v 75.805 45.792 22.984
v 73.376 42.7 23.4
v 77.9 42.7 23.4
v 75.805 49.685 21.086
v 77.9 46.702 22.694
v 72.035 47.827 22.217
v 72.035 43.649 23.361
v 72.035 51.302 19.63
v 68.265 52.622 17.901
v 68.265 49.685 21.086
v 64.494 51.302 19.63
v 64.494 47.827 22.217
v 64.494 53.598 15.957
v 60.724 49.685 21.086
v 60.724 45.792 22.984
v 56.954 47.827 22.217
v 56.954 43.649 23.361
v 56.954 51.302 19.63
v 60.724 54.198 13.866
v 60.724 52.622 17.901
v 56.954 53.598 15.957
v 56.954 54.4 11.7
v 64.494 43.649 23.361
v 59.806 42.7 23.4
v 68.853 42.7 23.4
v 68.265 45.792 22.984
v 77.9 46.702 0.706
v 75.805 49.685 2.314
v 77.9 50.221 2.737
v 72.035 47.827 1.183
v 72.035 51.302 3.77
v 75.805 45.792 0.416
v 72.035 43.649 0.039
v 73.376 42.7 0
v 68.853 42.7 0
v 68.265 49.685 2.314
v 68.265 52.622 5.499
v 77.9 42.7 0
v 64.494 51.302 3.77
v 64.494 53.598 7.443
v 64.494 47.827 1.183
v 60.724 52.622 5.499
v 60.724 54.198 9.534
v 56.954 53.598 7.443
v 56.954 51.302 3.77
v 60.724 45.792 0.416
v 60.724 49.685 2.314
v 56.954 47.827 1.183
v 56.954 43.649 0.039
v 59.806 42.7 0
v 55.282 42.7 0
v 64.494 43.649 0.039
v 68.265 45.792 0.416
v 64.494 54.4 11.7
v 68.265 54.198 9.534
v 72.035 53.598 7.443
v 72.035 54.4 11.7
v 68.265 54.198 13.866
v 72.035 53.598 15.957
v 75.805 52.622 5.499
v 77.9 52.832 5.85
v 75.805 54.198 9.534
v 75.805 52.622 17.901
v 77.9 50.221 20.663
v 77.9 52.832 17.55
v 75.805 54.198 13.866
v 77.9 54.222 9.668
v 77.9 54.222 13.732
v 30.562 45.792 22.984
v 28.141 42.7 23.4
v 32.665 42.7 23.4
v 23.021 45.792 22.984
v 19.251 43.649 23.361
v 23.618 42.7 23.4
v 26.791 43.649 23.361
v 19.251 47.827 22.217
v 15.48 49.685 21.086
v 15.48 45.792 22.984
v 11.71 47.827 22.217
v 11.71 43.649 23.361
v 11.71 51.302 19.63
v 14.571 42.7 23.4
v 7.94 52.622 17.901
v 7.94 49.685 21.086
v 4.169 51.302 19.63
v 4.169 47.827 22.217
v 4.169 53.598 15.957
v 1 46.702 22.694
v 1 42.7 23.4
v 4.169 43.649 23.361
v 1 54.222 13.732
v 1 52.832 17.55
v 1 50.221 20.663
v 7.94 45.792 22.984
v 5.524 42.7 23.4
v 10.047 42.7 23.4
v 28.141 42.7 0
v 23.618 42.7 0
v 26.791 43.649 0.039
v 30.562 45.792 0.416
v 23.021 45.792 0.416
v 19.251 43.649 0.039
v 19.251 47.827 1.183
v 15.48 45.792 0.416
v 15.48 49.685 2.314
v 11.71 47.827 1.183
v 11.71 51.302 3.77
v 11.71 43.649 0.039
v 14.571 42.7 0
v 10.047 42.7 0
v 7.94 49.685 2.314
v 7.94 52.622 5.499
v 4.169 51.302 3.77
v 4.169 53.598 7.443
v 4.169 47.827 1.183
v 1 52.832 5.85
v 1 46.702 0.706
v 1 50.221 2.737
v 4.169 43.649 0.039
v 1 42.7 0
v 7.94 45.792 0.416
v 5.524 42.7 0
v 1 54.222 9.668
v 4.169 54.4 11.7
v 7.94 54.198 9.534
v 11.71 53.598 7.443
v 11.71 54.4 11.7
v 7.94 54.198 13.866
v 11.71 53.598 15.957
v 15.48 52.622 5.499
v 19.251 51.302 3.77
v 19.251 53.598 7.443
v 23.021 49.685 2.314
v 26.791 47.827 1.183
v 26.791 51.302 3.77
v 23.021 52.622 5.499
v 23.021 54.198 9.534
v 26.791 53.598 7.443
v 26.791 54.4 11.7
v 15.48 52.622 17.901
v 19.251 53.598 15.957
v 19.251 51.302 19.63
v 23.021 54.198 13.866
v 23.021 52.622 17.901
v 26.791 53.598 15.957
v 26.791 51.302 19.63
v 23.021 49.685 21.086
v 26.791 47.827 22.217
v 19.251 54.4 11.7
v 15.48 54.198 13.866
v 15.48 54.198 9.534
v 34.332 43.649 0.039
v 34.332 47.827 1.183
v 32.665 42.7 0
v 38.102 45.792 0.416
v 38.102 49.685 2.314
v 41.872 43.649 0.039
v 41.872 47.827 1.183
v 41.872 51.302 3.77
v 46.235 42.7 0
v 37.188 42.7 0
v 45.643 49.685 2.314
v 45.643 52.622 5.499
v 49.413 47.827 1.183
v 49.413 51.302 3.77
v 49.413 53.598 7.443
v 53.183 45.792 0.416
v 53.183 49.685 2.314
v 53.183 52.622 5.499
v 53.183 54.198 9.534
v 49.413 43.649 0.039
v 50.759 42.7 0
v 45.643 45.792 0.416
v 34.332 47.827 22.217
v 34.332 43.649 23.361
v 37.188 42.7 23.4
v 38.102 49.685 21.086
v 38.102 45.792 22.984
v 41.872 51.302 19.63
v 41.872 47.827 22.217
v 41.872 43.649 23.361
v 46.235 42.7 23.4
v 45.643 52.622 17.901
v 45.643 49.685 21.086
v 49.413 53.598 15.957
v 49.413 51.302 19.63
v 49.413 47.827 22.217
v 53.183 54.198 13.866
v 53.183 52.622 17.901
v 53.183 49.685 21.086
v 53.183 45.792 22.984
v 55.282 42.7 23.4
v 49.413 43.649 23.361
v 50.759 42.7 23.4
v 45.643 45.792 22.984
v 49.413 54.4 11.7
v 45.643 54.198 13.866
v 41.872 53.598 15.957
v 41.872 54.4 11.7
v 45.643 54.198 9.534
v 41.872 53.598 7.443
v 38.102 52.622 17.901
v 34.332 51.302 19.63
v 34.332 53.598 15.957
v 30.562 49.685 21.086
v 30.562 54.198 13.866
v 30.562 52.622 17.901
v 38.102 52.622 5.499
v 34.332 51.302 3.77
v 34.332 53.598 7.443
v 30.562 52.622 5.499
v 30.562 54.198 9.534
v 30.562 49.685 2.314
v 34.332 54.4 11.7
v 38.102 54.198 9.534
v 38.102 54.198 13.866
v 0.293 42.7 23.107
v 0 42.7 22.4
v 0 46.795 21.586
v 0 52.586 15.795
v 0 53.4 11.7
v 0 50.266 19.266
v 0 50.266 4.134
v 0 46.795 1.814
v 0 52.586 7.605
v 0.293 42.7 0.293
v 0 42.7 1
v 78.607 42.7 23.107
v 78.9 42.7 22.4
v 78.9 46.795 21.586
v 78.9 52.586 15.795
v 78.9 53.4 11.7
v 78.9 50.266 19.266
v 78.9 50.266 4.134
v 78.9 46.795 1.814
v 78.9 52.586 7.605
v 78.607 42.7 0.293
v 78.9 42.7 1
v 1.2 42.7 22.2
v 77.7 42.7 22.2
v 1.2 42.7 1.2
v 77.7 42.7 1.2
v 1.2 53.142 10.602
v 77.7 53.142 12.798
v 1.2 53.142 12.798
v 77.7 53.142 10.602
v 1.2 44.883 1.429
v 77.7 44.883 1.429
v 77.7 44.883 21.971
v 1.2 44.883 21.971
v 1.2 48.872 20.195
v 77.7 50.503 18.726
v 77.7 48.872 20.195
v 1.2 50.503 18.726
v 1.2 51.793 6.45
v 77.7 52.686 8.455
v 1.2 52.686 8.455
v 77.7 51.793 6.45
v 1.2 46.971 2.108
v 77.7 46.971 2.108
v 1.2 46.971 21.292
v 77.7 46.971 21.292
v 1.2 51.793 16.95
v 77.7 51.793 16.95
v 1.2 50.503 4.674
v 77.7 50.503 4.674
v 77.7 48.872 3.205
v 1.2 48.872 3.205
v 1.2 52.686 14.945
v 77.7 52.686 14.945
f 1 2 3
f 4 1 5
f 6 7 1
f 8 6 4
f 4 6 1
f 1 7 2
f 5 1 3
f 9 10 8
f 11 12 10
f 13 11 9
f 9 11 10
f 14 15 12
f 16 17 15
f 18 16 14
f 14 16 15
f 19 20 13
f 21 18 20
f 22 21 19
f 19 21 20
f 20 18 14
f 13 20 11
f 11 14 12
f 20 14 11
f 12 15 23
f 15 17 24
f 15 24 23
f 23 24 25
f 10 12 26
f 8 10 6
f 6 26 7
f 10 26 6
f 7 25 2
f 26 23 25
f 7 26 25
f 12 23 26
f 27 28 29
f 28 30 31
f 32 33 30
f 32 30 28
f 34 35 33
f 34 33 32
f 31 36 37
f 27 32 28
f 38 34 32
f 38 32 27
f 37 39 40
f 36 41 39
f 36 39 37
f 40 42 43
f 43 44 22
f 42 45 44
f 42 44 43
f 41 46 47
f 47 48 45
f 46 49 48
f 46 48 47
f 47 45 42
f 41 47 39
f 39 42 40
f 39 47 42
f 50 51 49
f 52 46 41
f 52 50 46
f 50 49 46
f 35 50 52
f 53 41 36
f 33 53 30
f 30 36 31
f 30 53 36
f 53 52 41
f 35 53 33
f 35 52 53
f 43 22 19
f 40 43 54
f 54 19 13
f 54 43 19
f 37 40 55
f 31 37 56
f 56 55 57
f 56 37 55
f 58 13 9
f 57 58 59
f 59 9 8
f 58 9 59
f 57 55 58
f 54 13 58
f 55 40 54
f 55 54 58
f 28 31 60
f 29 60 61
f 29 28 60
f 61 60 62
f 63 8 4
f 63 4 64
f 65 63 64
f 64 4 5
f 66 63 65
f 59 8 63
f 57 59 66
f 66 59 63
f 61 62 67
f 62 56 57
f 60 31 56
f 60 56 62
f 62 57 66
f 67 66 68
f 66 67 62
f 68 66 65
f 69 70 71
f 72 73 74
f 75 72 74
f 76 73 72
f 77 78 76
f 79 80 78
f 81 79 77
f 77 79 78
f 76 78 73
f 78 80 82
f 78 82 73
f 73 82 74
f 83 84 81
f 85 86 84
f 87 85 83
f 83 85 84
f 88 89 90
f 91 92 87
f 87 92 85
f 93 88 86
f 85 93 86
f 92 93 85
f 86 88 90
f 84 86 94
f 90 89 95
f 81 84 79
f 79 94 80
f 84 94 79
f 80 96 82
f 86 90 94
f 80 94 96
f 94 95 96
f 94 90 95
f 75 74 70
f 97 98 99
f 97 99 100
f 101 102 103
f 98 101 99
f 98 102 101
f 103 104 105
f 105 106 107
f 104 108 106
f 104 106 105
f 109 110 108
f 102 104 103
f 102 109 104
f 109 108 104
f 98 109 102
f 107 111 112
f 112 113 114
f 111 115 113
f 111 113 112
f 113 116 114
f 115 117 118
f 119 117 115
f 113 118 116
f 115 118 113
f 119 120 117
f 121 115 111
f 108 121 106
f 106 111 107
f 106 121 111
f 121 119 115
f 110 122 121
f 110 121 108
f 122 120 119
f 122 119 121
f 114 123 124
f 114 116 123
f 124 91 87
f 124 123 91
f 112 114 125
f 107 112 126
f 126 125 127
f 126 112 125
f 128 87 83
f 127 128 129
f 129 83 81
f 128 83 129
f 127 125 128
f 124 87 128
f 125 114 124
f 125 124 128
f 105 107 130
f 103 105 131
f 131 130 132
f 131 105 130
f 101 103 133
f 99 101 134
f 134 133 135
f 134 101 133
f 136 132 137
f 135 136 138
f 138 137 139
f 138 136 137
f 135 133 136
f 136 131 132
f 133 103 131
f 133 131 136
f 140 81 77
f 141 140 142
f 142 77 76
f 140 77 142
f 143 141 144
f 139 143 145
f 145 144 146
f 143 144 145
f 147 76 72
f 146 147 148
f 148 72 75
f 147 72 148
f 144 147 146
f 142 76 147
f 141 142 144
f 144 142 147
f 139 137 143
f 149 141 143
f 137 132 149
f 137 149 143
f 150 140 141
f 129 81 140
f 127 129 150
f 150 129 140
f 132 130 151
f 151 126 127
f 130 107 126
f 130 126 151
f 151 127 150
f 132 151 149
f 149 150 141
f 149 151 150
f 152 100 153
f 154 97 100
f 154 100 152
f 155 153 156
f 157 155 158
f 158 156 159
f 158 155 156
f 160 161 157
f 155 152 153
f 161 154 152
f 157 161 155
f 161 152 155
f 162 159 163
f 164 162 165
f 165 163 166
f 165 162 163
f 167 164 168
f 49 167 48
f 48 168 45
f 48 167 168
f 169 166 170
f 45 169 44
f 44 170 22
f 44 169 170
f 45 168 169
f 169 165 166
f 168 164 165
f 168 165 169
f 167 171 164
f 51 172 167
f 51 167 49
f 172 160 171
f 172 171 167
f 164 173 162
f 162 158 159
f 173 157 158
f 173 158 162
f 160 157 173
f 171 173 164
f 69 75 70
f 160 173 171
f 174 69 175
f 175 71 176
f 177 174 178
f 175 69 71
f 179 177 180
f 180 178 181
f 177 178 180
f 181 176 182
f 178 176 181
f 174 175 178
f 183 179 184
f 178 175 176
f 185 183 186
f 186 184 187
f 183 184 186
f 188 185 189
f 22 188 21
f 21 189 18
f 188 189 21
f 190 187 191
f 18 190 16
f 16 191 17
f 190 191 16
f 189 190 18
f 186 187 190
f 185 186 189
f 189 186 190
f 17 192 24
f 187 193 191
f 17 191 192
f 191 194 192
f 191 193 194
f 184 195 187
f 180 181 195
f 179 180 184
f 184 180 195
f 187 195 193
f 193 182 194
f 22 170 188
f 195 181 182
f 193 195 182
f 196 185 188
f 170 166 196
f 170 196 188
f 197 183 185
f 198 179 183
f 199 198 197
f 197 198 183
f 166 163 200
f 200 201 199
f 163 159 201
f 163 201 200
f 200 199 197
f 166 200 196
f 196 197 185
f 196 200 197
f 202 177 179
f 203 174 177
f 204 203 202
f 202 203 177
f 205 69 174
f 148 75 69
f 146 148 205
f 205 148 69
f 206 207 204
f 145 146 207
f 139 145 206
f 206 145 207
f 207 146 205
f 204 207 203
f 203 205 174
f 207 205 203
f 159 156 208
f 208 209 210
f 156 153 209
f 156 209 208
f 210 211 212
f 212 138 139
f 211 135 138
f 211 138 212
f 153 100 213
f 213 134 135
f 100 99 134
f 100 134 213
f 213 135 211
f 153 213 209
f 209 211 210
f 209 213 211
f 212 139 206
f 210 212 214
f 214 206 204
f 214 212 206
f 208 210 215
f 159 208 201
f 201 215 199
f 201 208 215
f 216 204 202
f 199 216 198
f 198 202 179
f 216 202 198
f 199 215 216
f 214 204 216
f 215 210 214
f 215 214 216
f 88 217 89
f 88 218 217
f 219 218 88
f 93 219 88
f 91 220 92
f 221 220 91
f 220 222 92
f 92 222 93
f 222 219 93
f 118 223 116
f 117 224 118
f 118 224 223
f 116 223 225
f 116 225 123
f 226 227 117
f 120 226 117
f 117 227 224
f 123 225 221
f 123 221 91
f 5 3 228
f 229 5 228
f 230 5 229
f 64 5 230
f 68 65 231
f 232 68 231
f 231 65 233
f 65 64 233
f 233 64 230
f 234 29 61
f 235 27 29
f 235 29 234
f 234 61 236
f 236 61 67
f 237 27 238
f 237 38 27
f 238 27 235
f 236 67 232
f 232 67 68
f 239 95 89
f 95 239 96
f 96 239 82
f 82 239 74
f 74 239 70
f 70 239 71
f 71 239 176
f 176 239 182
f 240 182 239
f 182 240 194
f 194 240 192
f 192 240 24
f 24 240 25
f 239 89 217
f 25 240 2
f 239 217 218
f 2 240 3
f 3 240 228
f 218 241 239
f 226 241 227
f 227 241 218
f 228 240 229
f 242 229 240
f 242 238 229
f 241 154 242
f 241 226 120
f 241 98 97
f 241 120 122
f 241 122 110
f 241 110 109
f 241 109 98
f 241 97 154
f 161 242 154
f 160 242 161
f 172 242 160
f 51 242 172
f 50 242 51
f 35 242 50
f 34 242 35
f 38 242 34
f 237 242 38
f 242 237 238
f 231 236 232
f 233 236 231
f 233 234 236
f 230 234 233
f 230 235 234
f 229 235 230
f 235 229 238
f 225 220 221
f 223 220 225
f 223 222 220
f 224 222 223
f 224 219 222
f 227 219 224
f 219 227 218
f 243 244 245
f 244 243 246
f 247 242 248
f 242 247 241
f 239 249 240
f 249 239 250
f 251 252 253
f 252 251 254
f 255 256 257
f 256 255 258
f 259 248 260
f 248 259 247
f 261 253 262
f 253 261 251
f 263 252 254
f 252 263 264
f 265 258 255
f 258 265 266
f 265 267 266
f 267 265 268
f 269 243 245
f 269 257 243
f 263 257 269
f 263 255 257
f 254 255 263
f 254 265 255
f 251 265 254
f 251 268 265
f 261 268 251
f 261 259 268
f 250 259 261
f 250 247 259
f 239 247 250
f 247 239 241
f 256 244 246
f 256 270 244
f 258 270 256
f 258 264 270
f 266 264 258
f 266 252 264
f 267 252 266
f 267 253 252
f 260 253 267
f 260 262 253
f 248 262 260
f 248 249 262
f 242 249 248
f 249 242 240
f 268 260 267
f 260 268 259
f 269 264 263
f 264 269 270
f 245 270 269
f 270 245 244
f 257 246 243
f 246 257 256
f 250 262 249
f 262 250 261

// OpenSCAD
// CSG file generated from FreeCAD 0.18.Unknown
group() {
 group(){
difference() {
polyhedron ( points = [[1.000000,42.700001,23.400000],[77.900002,42.700001,23.400000],[1.000000,42.700001,0.000000],[77.900002,42.700001,0.000000],[78.900002,42.700001,22.400000],[78.900002,42.700001,11.700000],[0.000000,42.700001,11.700000],[-0.000000,42.700001,22.400000],[0.000000,42.700001,1.000000],[78.900002,42.700001,1.000000],[5.523530,42.700001,23.400000],[10.047059,42.700001,23.400000],[14.570588,42.700001,23.400000],[19.094118,42.700001,23.400000],[23.617647,42.700001,23.400000],[28.141176,42.700001,23.400000],[32.664707,42.700001,23.400000],[37.188236,42.700001,23.400000],[41.711765,42.700001,23.400000],[46.235294,42.700001,23.400000],[50.758823,42.700001,23.400000],[55.282352,42.700001,23.400000],[59.805882,42.700001,23.400000],[64.329414,42.700001,23.400000],[68.852943,42.700001,23.400000],[73.376472,42.700001,23.400000],[1.000000,46.701637,0.705596],[1.000000,50.220615,2.737280],[1.000000,52.832497,5.850000],[1.000000,54.222252,9.668316],[1.000000,54.222252,13.731684],[1.000000,52.832497,17.549999],[1.000000,50.220615,20.662720],[1.000000,46.701637,22.694405],[77.900002,46.701637,0.705596],[77.900002,50.220615,2.737280],[77.900002,52.832497,5.850000],[77.900002,54.222252,9.668316],[77.900002,54.222252,13.731684],[77.900002,52.832497,17.549999],[77.900002,50.220615,20.662720],[77.900002,46.701637,22.694405],[5.523530,42.700001,0.000000],[10.047059,42.700001,0.000000],[14.570588,42.700001,0.000000],[19.094118,42.700001,0.000000],[23.617647,42.700001,0.000000],[28.141176,42.700001,0.000000],[32.664707,42.700001,0.000000],[37.188236,42.700001,0.000000],[41.711765,42.700001,0.000000],[46.235294,42.700001,0.000000],[50.758823,42.700001,0.000000],[55.282352,42.700001,0.000000],[59.805882,42.700001,0.000000],[64.329414,42.700001,0.000000],[68.852943,42.700001,0.000000],[73.376472,42.700001,0.000000],[78.900002,42.700001,14.375000],[78.900002,42.700001,17.049999],[78.900002,42.700001,19.725000],[78.607109,42.700001,23.107107],[4.641177,42.700001,11.700000],[9.282353,42.700001,11.700000],[13.923530,42.700001,11.700000],[18.564707,42.700001,11.700000],[23.205883,42.700001,11.700000],[27.847059,42.700001,11.700000],[32.488235,42.700001,11.700000],[37.129414,42.700001,11.700000],[41.770588,42.700001,11.700000],[46.411766,42.700001,11.700000],[51.052940,42.700001,11.700000],[55.694118,42.700001,11.700000],[60.335293,42.700001,11.700000],[64.976471,42.700001,11.700000],[69.617645,42.700001,11.700000],[74.258827,42.700001,11.700000],[0.000000,42.700001,14.375000],[0.000000,42.700001,17.049999],[0.000000,42.700001,19.725000],[0.292893,42.700001,23.107107],[0.292893,42.700001,0.292893],[0.000000,46.794712,1.814489],[0.000000,50.266041,4.133957],[0.000000,52.585510,7.605287],[0.000000,53.400002,11.700000],[-0.000000,52.585510,15.794713],[-0.000000,50.266041,19.266043],[-0.000000,46.794712,21.585510],[78.607109,42.700001,0.292893],[78.900002,46.794712,1.814489],[78.900002,50.266041,4.133957],[78.900002,52.585510,7.605287],[78.900002,53.400002,11.700000],[78.900002,52.585510,15.794713],[78.900002,50.266041,19.266043],[78.900002,46.794712,21.585510],[0.000000,42.700001,9.025000],[0.000000,42.700001,6.350000],[0.000000,42.700001,3.675000],[78.900002,42.700001,9.025000],[78.900002,42.700001,6.350000],[78.900002,42.700001,3.675000],[26.791178,43.649349,23.361422],[11.709884,51.302250,19.630404],[26.791178,43.649349,0.038579],[56.953762,54.400002,11.700000],[41.872471,51.302250,19.630404],[56.953762,43.649349,23.361422],[72.035057,51.302250,19.630404],[72.035057,51.302250,3.769596],[56.953762,43.649349,0.038579],[41.872471,51.302250,3.769596],[11.709884,51.302250,3.769596],[26.791178,54.400002,11.700000],[72.035057,43.649349,23.361422],[64.494408,47.827221,22.216730],[64.494408,53.598080,15.956975],[56.953762,51.302250,19.630404],[72.035057,43.649349,0.038579],[64.494408,53.598080,7.443025],[64.494408,47.827221,1.183270],[56.953762,51.302250,3.769596],[72.035057,54.400002,11.700000],[19.250530,47.827221,22.216730],[11.709884,43.649349,23.361422],[4.169238,47.827221,22.216730],[4.169238,53.598080,15.956975],[19.250530,47.827221,1.183270],[11.709884,43.649349,0.038579],[4.169238,53.598080,7.443025],[4.169238,47.827221,1.183270],[11.709884,54.400002,11.700000],[19.250530,53.598080,7.443025],[26.791178,51.302250,3.769596],[19.250530,53.598080,15.956975],[26.791178,51.302250,19.630404],[34.331825,47.827221,1.183270],[41.872471,43.649349,0.038579],[49.413116,47.827221,1.183270],[49.413116,53.598080,7.443025],[34.331825,47.827221,22.216730],[41.872471,43.649349,23.361422],[49.413116,53.598080,15.956975],[49.413116,47.827221,22.216730],[41.872471,54.400002,11.700000],[34.331825,53.598080,15.956975],[34.331825,53.598080,7.443025],[75.805382,45.791725,22.984116],[75.805382,49.685474,21.085794],[72.035057,47.827221,22.216730],[68.264732,49.685474,21.085794],[68.264732,52.621655,17.900867],[64.494408,51.302250,19.630404],[60.724087,45.791725,22.984116],[60.724087,49.685474,21.085794],[56.953762,47.827221,22.216730],[60.724087,52.621655,17.900867],[60.724087,54.197773,13.865925],[56.953762,53.598080,15.956975],[64.494408,43.649349,23.361422],[68.264732,45.791725,22.984116],[75.805382,49.685474,2.314205],[75.805382,45.791725,0.415885],[72.035057,47.827221,1.183270],[68.264732,52.621655,5.499132],[68.264732,49.685474,2.314205],[64.494408,51.302250,3.769596],[60.724087,54.197773,9.534076],[60.724087,52.621655,5.499132],[56.953762,53.598080,7.443025],[60.724087,49.685474,2.314205],[60.724087,45.791725,0.415885],[56.953762,47.827221,1.183270],[64.494408,43.649349,0.038579],[68.264732,45.791725,0.415885],[64.494408,54.400002,11.700000],[68.264732,54.197773,9.534076],[72.035057,53.598080,7.443025],[68.264732,54.197773,13.865925],[72.035057,53.598080,15.956975],[75.805382,52.621655,5.499132],[75.805382,52.621655,17.900867],[75.805382,54.197773,13.865925],[75.805382,54.197773,9.534076],[23.020853,45.791725,22.984116],[19.250530,43.649349,23.361422],[15.480207,45.791725,22.984116],[15.480207,49.685474,21.085794],[11.709884,47.827221,22.216730],[7.939561,49.685474,21.085794],[7.939561,52.621655,17.900867],[4.169238,51.302250,19.630404],[4.169238,43.649349,23.361422],[7.939561,45.791725,22.984116],[23.020853,45.791725,0.415885],[19.250530,43.649349,0.038579],[15.480207,49.685474,2.314205],[15.480207,45.791725,0.415885],[11.709884,47.827221,1.183270],[7.939561,52.621655,5.499132],[7.939561,49.685474,2.314205],[4.169238,51.302250,3.769596],[4.169238,43.649349,0.038579],[7.939561,45.791725,0.415885],[4.169238,54.400002,11.700000],[7.939561,54.197773,9.534076],[11.709884,53.598080,7.443025],[7.939561,54.197773,13.865925],[11.709884,53.598080,15.956975],[15.480207,52.621655,5.499132],[19.250530,51.302250,3.769596],[23.020853,49.685474,2.314205],[26.791178,47.827221,1.183270],[23.020853,52.621655,5.499132],[23.020853,54.197773,9.534076],[26.791178,53.598080,7.443025],[15.480207,52.621655,17.900867],[19.250530,51.302250,19.630404],[23.020853,54.197773,13.865925],[23.020853,52.621655,17.900867],[26.791178,53.598080,15.956975],[23.020853,49.685474,21.085794],[26.791178,47.827221,22.216730],[19.250530,54.400002,11.700000],[15.480207,54.197773,13.865925],[15.480207,54.197773,9.534076],[30.561501,45.791725,0.415885],[34.331825,43.649349,0.038579],[38.102146,45.791725,0.415885],[38.102146,49.685474,2.314205],[41.872471,47.827221,1.183270],[45.642792,49.685474,2.314205],[45.642792,52.621655,5.499132],[49.413116,51.302250,3.769596],[53.183441,45.791725,0.415885],[53.183441,49.685474,2.314205],[53.183441,52.621655,5.499132],[53.183441,54.197773,9.534076],[49.413116,43.649349,0.038579],[45.642792,45.791725,0.415885],[30.561501,45.791725,22.984116],[34.331825,43.649349,23.361422],[38.102146,49.685474,21.085794],[38.102146,45.791725,22.984116],[41.872471,47.827221,22.216730],[45.642792,52.621655,17.900867],[45.642792,49.685474,21.085794],[49.413116,51.302250,19.630404],[53.183441,54.197773,13.865925],[53.183441,52.621655,17.900867],[53.183441,49.685474,21.085794],[53.183441,45.791725,22.984116],[49.413116,43.649349,23.361422],[45.642792,45.791725,22.984116],[49.413116,54.400002,11.700000],[45.642792,54.197773,13.865925],[41.872471,53.598080,15.956975],[45.642792,54.197773,9.534076],[41.872471,53.598080,7.443025],[38.102146,52.621655,17.900867],[34.331825,51.302250,19.630404],[30.561501,49.685474,21.085794],[30.561501,52.621655,17.900867],[30.561501,54.197773,13.865925],[38.102146,52.621655,5.499132],[34.331825,51.302250,3.769596],[30.561501,54.197773,9.534076],[30.561501,52.621655,5.499132],[30.561501,49.685474,2.314205],[34.331825,54.400002,11.700000],[38.102146,54.197773,9.534076],[38.102146,54.197773,13.865925],[45.951241,42.700001,17.549999],[70.887100,42.700001,17.549999],[21.015387,42.700001,17.549999],[77.121063,42.700001,21.149181],[77.121063,42.700001,13.950819],[52.185204,42.700001,21.149181],[52.185204,42.700001,13.950819],[58.419170,42.700001,17.549999],[64.653130,42.700001,13.950819],[64.653130,42.700001,21.149181],[2.313494,42.700001,21.149181],[2.313494,42.700001,13.950819],[8.547459,42.700001,17.549999],[14.781422,42.700001,13.950819],[14.781422,42.700001,21.149181],[39.717278,42.700001,13.950819],[39.717278,42.700001,21.149181],[33.483315,42.700001,17.549999],[27.249350,42.700001,21.149181],[27.249350,42.700001,13.950819],[74.004082,42.700001,22.948771],[74.004082,42.700001,19.349590],[70.887100,42.700001,21.149181],[74.004082,42.700001,15.750410],[74.004082,42.700001,12.151229],[70.887100,42.700001,13.950819],[77.121063,42.700001,17.549999],[55.302189,42.700001,22.948771],[49.068222,42.700001,22.948771],[49.068222,42.700001,19.349590],[45.951241,42.700001,21.149181],[55.302189,42.700001,12.151229],[49.068222,42.700001,15.750410],[49.068222,42.700001,12.151229],[45.951241,42.700001,13.950819],[52.185204,42.700001,17.549999],[55.302189,42.700001,15.750410],[58.419170,42.700001,13.950819],[55.302189,42.700001,19.349590],[58.419170,42.700001,21.149181],[61.536152,42.700001,12.151229],[67.770111,42.700001,12.151229],[67.770111,42.700001,15.750410],[61.536152,42.700001,22.948771],[67.770111,42.700001,19.349590],[67.770111,42.700001,22.948771],[64.653130,42.700001,17.549999],[61.536152,42.700001,19.349590],[61.536152,42.700001,15.750410],[5.430476,42.700001,22.948771],[5.430476,42.700001,12.151229],[2.313494,42.700001,17.549999],[5.430476,42.700001,15.750410],[8.547459,42.700001,13.950819],[5.430476,42.700001,19.349590],[8.547459,42.700001,21.149181],[11.664440,42.700001,12.151229],[17.898403,42.700001,12.151229],[17.898403,42.700001,15.750410],[21.015387,42.700001,13.950819],[11.664440,42.700001,22.948771],[17.898403,42.700001,19.349590],[17.898403,42.700001,22.948771],[21.015387,42.700001,21.149181],[14.781422,42.700001,17.549999],[11.664440,42.700001,19.349590],[11.664440,42.700001,15.750410],[36.600296,42.700001,12.151229],[42.834259,42.700001,12.151229],[42.834259,42.700001,15.750410],[36.600296,42.700001,22.948771],[42.834259,42.700001,19.349590],[42.834259,42.700001,22.948771],[39.717278,42.700001,17.549999],[36.600296,42.700001,19.349590],[33.483315,42.700001,21.149181],[36.600296,42.700001,15.750410],[33.483315,42.700001,13.950819],[30.366331,42.700001,22.948771],[24.132368,42.700001,22.948771],[24.132368,42.700001,19.349590],[30.366331,42.700001,12.151229],[24.132368,42.700001,15.750410],[24.132368,42.700001,12.151229],[27.249350,42.700001,17.549999],[30.366331,42.700001,15.750410],[30.366331,42.700001,19.349590],[45.951241,42.700001,5.850000],[21.015387,42.700001,5.850000],[70.887100,42.700001,5.850000],[77.121063,42.700001,2.250819],[77.121063,42.700001,9.449181],[52.185204,42.700001,2.250819],[52.185204,42.700001,9.449181],[58.419170,42.700001,5.850000],[64.653130,42.700001,9.449181],[64.653130,42.700001,2.250819],[2.313494,42.700001,2.250819],[2.313494,42.700001,9.449181],[8.547459,42.700001,5.850000],[14.781422,42.700001,9.449181],[14.781422,42.700001,2.250819],[39.717278,42.700001,9.449181],[39.717278,42.700001,2.250819],[33.483315,42.700001,5.850000],[27.249350,42.700001,2.250819],[27.249350,42.700001,9.449181],[74.004082,42.700001,0.451229],[74.004082,42.700001,4.050410],[70.887100,42.700001,2.250819],[74.004082,42.700001,7.649590],[74.004082,42.700001,11.248771],[70.887100,42.700001,9.449181],[77.121063,42.700001,5.850000],[55.302189,42.700001,0.451229],[49.068222,42.700001,0.451229],[49.068222,42.700001,4.050410],[45.951241,42.700001,2.250819],[55.302189,42.700001,11.248771],[49.068222,42.700001,7.649590],[49.068222,42.700001,11.248771],[45.951241,42.700001,9.449181],[52.185204,42.700001,5.850000],[55.302189,42.700001,7.649590],[58.419170,42.700001,9.449181],[55.302189,42.700001,4.050410],[58.419170,42.700001,2.250819],[61.536152,42.700001,11.248771],[67.770111,42.700001,11.248771],[67.770111,42.700001,7.649590],[61.536152,42.700001,0.451229],[67.770111,42.700001,4.050410],[67.770111,42.700001,0.451229],[64.653130,42.700001,5.850000],[61.536152,42.700001,4.050410],[61.536152,42.700001,7.649590],[5.430476,42.700001,0.451229],[5.430476,42.700001,11.248771],[2.313494,42.700001,5.850000],[5.430476,42.700001,7.649590],[8.547459,42.700001,9.449181],[5.430476,42.700001,4.050410],[8.547459,42.700001,2.250819],[11.664440,42.700001,11.248771],[17.898403,42.700001,11.248771],[17.898403,42.700001,7.649590],[21.015387,42.700001,9.449181],[11.664440,42.700001,0.451229],[17.898403,42.700001,4.050410],[17.898403,42.700001,0.451229],[21.015387,42.700001,2.250819],[14.781422,42.700001,5.850000],[11.664440,42.700001,4.050410],[11.664440,42.700001,7.649590],[36.600296,42.700001,11.248771],[42.834259,42.700001,11.248771],[42.834259,42.700001,7.649590],[36.600296,42.700001,0.451229],[42.834259,42.700001,4.050410],[42.834259,42.700001,0.451229],[39.717278,42.700001,5.850000],[36.600296,42.700001,4.050410],[33.483315,42.700001,2.250819],[36.600296,42.700001,7.649590],[33.483315,42.700001,9.449181],[30.366331,42.700001,0.451229],[24.132368,42.700001,0.451229],[24.132368,42.700001,4.050410],[30.366331,42.700001,11.248771],[24.132368,42.700001,7.649590],[24.132368,42.700001,11.248771],[27.249350,42.700001,5.850000],[30.366331,42.700001,7.649590],[30.366331,42.700001,4.050410],[78.900002,48.918293,6.124682],[78.900002,48.918293,17.275318],[78.900002,44.089928,3.337023],[78.900002,44.089928,8.912341],[78.900002,44.089928,14.487659],[78.900002,44.089928,20.062977],[78.900002,48.918293,11.700000],[78.900002,48.918293,3.337023],[78.900002,46.504108,4.730853],[78.900002,46.504108,7.518512],[78.900002,44.089928,6.124682],[78.900002,46.504108,1.943194],[78.900002,48.918293,20.062977],[78.900002,46.504108,15.881489],[78.900002,46.504108,18.669147],[78.900002,44.089928,17.275318],[78.900002,46.504108,21.456806],[78.900002,44.089928,11.700000],[78.900002,46.504108,13.093829],[78.900002,48.918293,14.487659],[78.900002,46.504108,10.306170],[78.900002,48.918293,8.912341],[78.900002,51.332478,15.881489],[78.900002,51.332478,7.518512],[78.900002,51.332478,10.306170],[78.900002,51.332478,13.093829],[0.000000,48.918293,6.124682],[0.000000,48.918293,17.275318],[0.000000,44.089928,3.337023],[0.000000,44.089928,8.912341],[0.000000,44.089928,14.487659],[0.000000,44.089928,20.062977],[0.000000,48.918293,11.700000],[0.000000,48.918293,3.337023],[0.000000,46.504108,4.730853],[0.000000,46.504108,7.518512],[0.000000,44.089928,6.124682],[0.000000,46.504108,1.943194],[0.000000,48.918293,20.062977],[0.000000,46.504108,15.881489],[0.000000,46.504108,18.669147],[0.000000,44.089928,17.275318],[0.000000,46.504108,21.456806],[0.000000,44.089928,11.700000],[0.000000,46.504108,13.093829],[0.000000,48.918293,14.487659],[0.000000,46.504108,10.306170],[0.000000,48.918293,8.912341],[0.000000,51.332478,15.881489],[0.000000,51.332478,7.518512],[0.000000,51.332478,10.306170],[0.000000,51.332478,13.093829]], triangles = [[1,149,25],[149,41,150],[151,116,149],[110,151,150],[149,150,151],[116,25,149],[149,1,41],[153,152,110],[154,117,152],[118,154,153],[152,153,154],[156,155,117],[157,109,155],[119,157,156],[155,156,157],[159,158,118],[160,119,158],[107,160,159],[158,159,160],[156,158,119],[154,118,158],[117,154,156],[158,156,154],[161,117,155],[155,109,22],[155,22,161],[161,22,23],[162,152,117],[151,110,152],[116,151,162],[152,162,151],[25,116,24],[24,161,23],[162,161,24],[116,162,24],[117,161,162],[163,35,34],[165,111,163],[120,165,164],[163,164,165],[56,120,57],[120,164,57],[167,166,111],[164,163,34],[57,164,3],[164,34,3],[168,121,166],[122,168,167],[166,167,168],[170,169,121],[171,107,169],[123,171,170],[169,170,171],[173,172,122],[174,123,172],[112,174,173],[172,173,174],[170,172,123],[168,122,172],[121,168,170],[172,170,168],[53,112,54],[122,175,173],[173,175,54],[112,173,54],[175,55,54],[167,176,122],[165,120,176],[111,165,167],[176,167,165],[175,122,176],[55,175,56],[176,120,56],[176,56,175],[159,169,107],[177,121,169],[118,177,159],[169,159,177],[178,166,121],[179,111,166],[124,179,178],[166,178,179],[153,180,118],[181,124,180],[110,181,153],[180,153,181],[178,180,124],[177,118,180],[121,177,178],[180,178,177],[182,163,111],[182,36,35],[163,182,35],[182,185,36],[150,183,110],[150,40,183],[183,40,39],[150,41,40],[183,39,184],[181,110,183],[124,181,184],[183,184,181],[185,37,36],[179,124,185],[111,179,182],[185,182,179],[184,185,124],[37,185,38],[184,38,185],[184,39,38],[16,242,15],[14,187,13],[186,187,14],[104,186,14],[125,187,186],[189,188,125],[190,126,188],[105,190,189],[188,189,190],[187,125,188],[188,126,12],[188,12,187],[187,12,13],[192,191,105],[193,127,191],[128,193,192],[191,192,193],[0,194,33],[128,30,31],[128,31,193],[32,33,127],[127,193,32],[193,31,32],[127,33,194],[195,191,127],[10,194,0],[190,105,191],[126,190,195],[191,195,190],[12,126,11],[127,194,195],[126,195,11],[11,195,10],[194,10,195],[15,104,14],[46,106,47],[106,228,47],[197,129,196],[45,197,46],[196,106,46],[196,46,197],[199,198,129],[200,114,198],[130,200,199],[198,199,200],[43,130,44],[129,197,199],[199,197,44],[130,199,44],[197,45,44],[202,201,114],[203,131,201],[132,203,202],[201,202,203],[131,203,28],[27,132,26],[132,204,26],[203,27,28],[203,132,27],[26,204,2],[202,205,132],[200,130,205],[114,200,202],[205,202,200],[204,132,205],[42,205,43],[205,130,43],[2,204,42],[204,205,42],[206,131,29],[131,28,29],[128,206,30],[206,29,30],[207,201,131],[208,114,201],[133,208,207],[201,207,208],[192,209,128],[210,133,209],[105,210,192],[209,192,210],[207,209,133],[206,128,209],[131,206,207],[209,207,206],[211,198,114],[212,129,198],[134,212,211],[198,211,212],[213,196,129],[214,106,196],[135,214,213],[196,213,214],[216,215,134],[217,135,215],[115,217,216],[215,216,217],[213,215,135],[212,134,215],[129,212,213],[215,213,212],[189,218,105],[219,136,218],[125,219,189],[218,189,219],[221,220,136],[222,115,220],[137,222,221],[220,221,222],[186,223,125],[224,137,223],[104,224,186],[223,186,224],[221,223,137],[219,125,223],[136,219,221],[223,221,219],[216,220,115],[225,136,220],[134,225,216],[220,216,225],[226,218,136],[210,105,218],[133,210,226],[218,226,210],[211,227,134],[208,133,227],[114,208,211],[227,211,208],[226,227,133],[225,134,227],[136,225,226],[227,226,225],[138,229,228],[47,228,48],[228,229,48],[231,230,138],[232,139,230],[113,232,231],[230,231,232],[139,50,49],[229,138,230],[48,229,49],[230,139,49],[229,230,49],[234,233,113],[235,140,233],[141,235,234],[233,234,235],[237,236,140],[174,112,236],[123,174,237],[236,237,174],[239,238,141],[171,123,238],[107,171,239],[238,239,171],[237,238,123],[235,141,238],[140,235,237],[238,237,235],[240,140,236],[52,236,53],[236,112,53],[51,240,52],[240,236,52],[241,233,140],[232,113,233],[139,232,241],[233,241,232],[241,51,139],[140,240,241],[104,15,242],[50,139,51],[241,240,51],[243,142,242],[17,243,16],[245,244,142],[243,242,16],[246,108,244],[143,246,245],[244,245,246],[143,17,18],[245,17,143],[142,243,245],[248,247,108],[245,243,17],[249,144,247],[145,249,248],[247,248,249],[251,250,144],[160,107,250],[119,160,251],[250,251,160],[253,252,145],[157,119,252],[109,157,253],[252,253,157],[251,252,119],[249,145,252],[144,249,251],[252,251,249],[22,109,21],[145,254,253],[109,253,21],[21,253,20],[254,20,253],[19,143,18],[248,255,145],[246,143,255],[108,246,248],[255,248,246],[254,145,255],[20,254,19],[239,250,107],[255,143,19],[254,255,19],[256,144,250],[141,256,239],[250,239,256],[257,247,144],[258,108,247],[146,258,257],[247,257,258],[234,259,141],[260,146,259],[113,260,234],[259,234,260],[257,259,146],[256,141,259],[144,256,257],[259,257,256],[261,244,108],[262,142,244],[147,262,261],[244,261,262],[263,242,142],[224,104,242],[137,224,263],[242,263,224],[265,264,147],[222,137,264],[115,222,265],[264,265,222],[263,264,137],[262,147,264],[142,262,263],[264,263,262],[231,266,113],[267,148,266],[138,267,231],[266,231,267],[269,268,148],[217,115,268],[135,217,269],[268,269,217],[228,270,138],[214,135,270],[106,214,228],[270,228,214],[269,270,135],[267,138,270],[148,267,269],[270,269,267],[265,268,115],[271,148,268],[147,271,265],[268,265,271],[272,266,148],[260,113,266],[146,260,272],[266,272,260],[261,273,147],[258,146,273],[108,258,261],[273,261,258],[272,273,146],[271,147,273],[148,271,272],[273,272,271],[277,1,294],[61,1,4],[277,4,1],[295,277,294],[275,295,296],[294,296,295],[1,25,294],[294,25,296],[77,5,278],[278,5,58],[298,278,297],[299,297,275],[298,76,77],[297,299,298],[76,298,299],[295,275,297],[298,77,278],[300,297,278],[277,295,300],[297,300,295],[300,278,59],[58,59,278],[300,60,277],[277,60,4],[300,59,60],[22,301,313],[21,279,301],[303,279,302],[274,303,304],[304,19,346],[20,19,302],[302,19,304],[302,304,303],[279,21,20],[279,20,302],[305,72,73],[305,73,311],[72,305,280],[307,280,306],[308,306,274],[306,308,307],[70,71,342],[308,71,307],[71,72,307],[307,72,280],[303,274,306],[309,306,280],[279,303,309],[306,309,303],[310,280,305],[281,310,311],[305,311,310],[301,279,312],[313,312,281],[301,22,21],[312,313,301],[310,281,312],[309,312,279],[280,310,309],[312,309,310],[282,314,75],[316,282,315],[275,316,299],[315,76,299],[315,299,316],[75,76,315],[74,75,314],[282,75,315],[23,22,317],[24,23,319],[283,23,317],[319,283,318],[296,318,275],[318,296,319],[25,24,296],[296,24,319],[283,319,23],[316,275,318],[320,318,283],[282,316,320],[318,320,316],[321,283,317],[281,321,313],[317,22,313],[317,313,321],[314,282,322],[311,322,281],[322,311,314],[73,74,311],[311,74,314],[321,281,322],[320,322,282],[283,321,320],[322,320,321],[11,10,329],[0,323,10],[284,7,80],[323,0,284],[81,7,0],[284,0,7],[6,62,285],[285,62,324],[285,78,6],[78,285,79],[326,285,324],[284,80,325],[325,80,79],[325,79,285],[327,324,63],[286,326,327],[324,327,326],[323,284,328],[329,328,286],[323,329,10],[328,329,323],[326,286,328],[325,328,284],[285,326,325],[328,325,326],[63,64,330],[287,64,331],[330,64,287],[332,287,331],[276,332,333],[331,333,332],[64,65,331],[331,65,333],[12,11,334],[13,12,336],[288,12,334],[336,288,335],[337,335,276],[335,337,336],[14,13,337],[337,13,336],[288,336,12],[332,276,335],[338,335,288],[287,332,338],[335,338,332],[339,288,334],[286,339,329],[334,11,329],[334,329,339],[330,287,340],[327,340,286],[340,327,330],[62,63,324],[327,63,330],[339,286,340],[338,340,287],[288,339,338],[340,338,339],[68,341,351],[69,289,341],[343,289,342],[308,342,71],[274,343,308],[342,308,343],[289,69,70],[289,70,342],[344,290,17],[346,290,345],[18,17,290],[304,345,274],[345,304,346],[19,18,346],[346,18,290],[343,274,345],[347,345,290],[289,343,347],[345,347,343],[348,290,344],[349,344,16],[291,348,349],[344,349,348],[341,289,350],[351,350,291],[341,68,69],[350,351,341],[348,291,350],[347,350,289],[290,348,347],[350,347,348],[16,15,352],[292,15,353],[352,15,292],[354,292,353],[276,354,337],[353,337,354],[353,14,337],[15,14,353],[66,67,357],[293,67,355],[357,293,356],[333,356,276],[356,333,357],[65,66,333],[333,66,357],[293,357,67],[354,276,356],[358,356,293],[292,354,358],[356,358,354],[359,293,355],[291,359,351],[67,68,355],[355,68,351],[355,351,359],[352,292,360],[349,360,291],[360,349,352],[17,16,344],[349,16,352],[359,291,360],[358,360,292],[293,359,358],[360,358,359],[33,81,0],[33,7,81],[7,33,89],[32,89,33],[30,87,31],[86,87,30],[87,88,31],[31,88,32],[89,32,88],[84,28,27],[83,27,26],[27,83,84],[84,85,28],[85,29,28],[26,82,8],[82,26,2],[26,8,83],[85,86,29],[30,29,86],[41,1,61],[41,61,4],[4,97,41],[40,41,97],[38,39,95],[94,38,95],[95,39,96],[39,40,96],[97,96,40],[92,35,36],[91,34,35],[35,92,91],[92,36,93],[93,36,37],[34,9,90],[90,3,34],[34,91,9],[93,37,94],[38,94,37],[364,381,3],[90,9,3],[364,3,9],[382,381,364],[363,383,382],[381,382,383],[3,381,57],[381,383,57],[77,365,5],[365,101,5],[385,384,365],[386,363,384],[385,77,76],[384,385,386],[76,386,385],[382,384,363],[385,365,77],[387,365,384],[364,387,382],[384,382,387],[387,102,365],[101,365,102],[387,364,103],[364,9,103],[387,103,102],[54,400,388],[53,388,366],[390,389,366],[361,391,390],[391,433,51],[52,389,51],[389,391,51],[389,390,391],[366,52,53],[366,389,52],[392,73,72],[392,398,73],[72,367,392],[394,393,367],[395,361,393],[393,394,395],[70,429,71],[395,394,71],[71,394,72],[394,367,72],[390,393,361],[396,367,393],[366,396,390],[393,390,396],[397,392,367],[368,398,397],[392,397,398],[388,399,366],[400,368,399],[388,53,54],[399,388,400],[397,399,368],[396,366,399],[367,396,397],[399,397,396],[369,75,401],[403,402,369],[363,386,403],[402,386,76],[402,403,386],[75,402,76],[74,401,75],[369,402,75],[55,404,54],[56,406,55],[370,404,55],[406,405,370],[383,363,405],[405,406,383],[57,383,56],[383,406,56],[370,55,406],[403,405,363],[407,370,405],[369,407,403],[405,403,407],[408,404,370],[368,400,408],[404,400,54],[404,408,400],[401,409,369],[398,368,409],[409,401,398],[73,398,74],[398,401,74],[408,409,368],[407,369,409],[370,407,408],[409,408,407],[43,416,42],[2,42,410],[371,100,8],[410,371,2],[82,2,8],[371,8,2],[6,372,62],[372,411,62],[372,6,98],[98,99,372],[413,411,372],[371,412,100],[412,99,100],[412,372,99],[414,63,411],[373,414,413],[411,413,414],[410,415,371],[416,373,415],[410,42,416],[415,410,416],[413,415,373],[412,371,415],[372,412,413],[415,413,412],[63,417,64],[374,418,64],[417,374,64],[419,418,374],[362,420,419],[418,419,420],[64,418,65],[418,420,65],[44,421,43],[45,423,44],[375,421,44],[423,422,375],[424,362,422],[422,423,424],[46,424,45],[424,423,45],[375,44,423],[419,422,362],[425,375,422],[374,425,419],[422,419,425],[426,421,375],[373,416,426],[421,416,43],[421,426,416],[417,427,374],[414,373,427],[427,417,414],[62,411,63],[414,417,63],[426,427,373],[425,374,427],[375,425,426],[427,426,425],[68,438,428],[69,428,376],[430,429,376],[395,71,429],[361,395,430],[429,430,395],[376,70,69],[376,429,70],[431,49,377],[433,432,377],[50,377,49],[391,361,432],[432,433,391],[51,433,50],[433,377,50],[430,432,361],[434,377,432],[376,434,430],[432,430,434],[435,431,377],[436,48,431],[378,436,435],[431,435,436],[428,437,376],[438,378,437],[428,69,68],[437,428,438],[435,437,378],[434,376,437],[377,434,435],[437,435,434],[48,439,47],[379,440,47],[439,379,47],[441,440,379],[362,424,441],[440,441,424],[440,424,46],[47,440,46],[66,444,67],[380,442,67],[444,443,380],[420,362,443],[443,444,420],[65,420,66],[420,444,66],[380,67,444],[441,443,362],[445,380,443],[379,445,441],[443,441,445],[446,442,380],[378,438,446],[67,442,68],[442,438,68],[442,446,438],[439,447,379],[436,378,447],[447,439,436],[49,431,48],[436,439,48],[446,447,378],[445,379,447],[380,445,446],[447,446,445],[448,455,92],[471,448,92],[457,456,448],[458,450,456],[451,458,457],[456,457,458],[450,458,103],[451,465,101],[451,101,102],[458,102,103],[458,451,102],[450,103,9],[459,456,450],[459,450,9],[455,448,456],[459,91,456],[92,455,91],[455,456,91],[9,91,459],[460,449,96],[97,460,96],[462,461,449],[463,452,461],[453,463,462],[461,462,463],[452,59,58],[453,4,60],[453,60,463],[463,59,452],[463,60,59],[462,464,453],[449,460,462],[464,462,97],[460,97,462],[4,453,464],[464,97,4],[452,58,465],[465,5,101],[466,461,452],[465,58,5],[467,449,461],[454,467,466],[461,466,467],[457,468,451],[469,454,468],[448,469,457],[468,457,469],[466,468,454],[465,451,468],[452,465,466],[468,466,465],[470,95,96],[96,449,470],[470,473,95],[92,93,471],[94,472,93],[471,93,472],[469,448,471],[454,469,472],[471,472,469],[467,454,473],[449,467,470],[473,470,467],[472,473,454],[95,473,94],[473,472,94],[474,84,481],[497,84,474],[483,474,482],[484,482,476],[477,483,484],[482,484,483],[476,100,484],[477,98,491],[477,99,98],[484,100,99],[484,99,477],[476,8,100],[485,476,482],[485,8,476],[481,482,474],[485,482,83],[84,83,481],[481,83,482],[8,485,83],[486,88,475],[89,88,486],[488,475,487],[489,487,478],[479,488,489],[487,489,488],[478,78,79],[479,80,7],[479,489,80],[489,478,79],[489,79,80],[488,479,490],[475,488,486],[490,89,488],[486,488,89],[7,490,479],[490,7,89],[478,491,78],[491,98,6],[492,478,487],[491,6,78],[493,487,475],[480,492,493],[487,493,492],[483,477,494],[495,494,480],[474,483,495],[494,495,483],[492,480,494],[491,494,477],[478,492,491],[494,491,492],[496,88,87],[88,496,475],[496,87,499],[84,497,85],[86,85,498],[497,498,85],[495,497,474],[480,498,495],[497,495,498],[493,499,480],[475,496,493],[499,493,496],[498,480,499],[87,86,499],[499,86,498]]);
multmatrix([[2.220446049250313e-16, 0.0, 1.0,            1.2], [0.0, 1.0, 0.0, 42.7], [-1.0, 0.0, 2.220446049250313e-16, 11.7], [             0, 0, 0, 1]]){
cylinder($fn = 0, $fa = 12.000000, $fs = 2.000000, h = 76.5, r1 = 10.5, r2 = 10.5, center = false);
}
}
}
}
